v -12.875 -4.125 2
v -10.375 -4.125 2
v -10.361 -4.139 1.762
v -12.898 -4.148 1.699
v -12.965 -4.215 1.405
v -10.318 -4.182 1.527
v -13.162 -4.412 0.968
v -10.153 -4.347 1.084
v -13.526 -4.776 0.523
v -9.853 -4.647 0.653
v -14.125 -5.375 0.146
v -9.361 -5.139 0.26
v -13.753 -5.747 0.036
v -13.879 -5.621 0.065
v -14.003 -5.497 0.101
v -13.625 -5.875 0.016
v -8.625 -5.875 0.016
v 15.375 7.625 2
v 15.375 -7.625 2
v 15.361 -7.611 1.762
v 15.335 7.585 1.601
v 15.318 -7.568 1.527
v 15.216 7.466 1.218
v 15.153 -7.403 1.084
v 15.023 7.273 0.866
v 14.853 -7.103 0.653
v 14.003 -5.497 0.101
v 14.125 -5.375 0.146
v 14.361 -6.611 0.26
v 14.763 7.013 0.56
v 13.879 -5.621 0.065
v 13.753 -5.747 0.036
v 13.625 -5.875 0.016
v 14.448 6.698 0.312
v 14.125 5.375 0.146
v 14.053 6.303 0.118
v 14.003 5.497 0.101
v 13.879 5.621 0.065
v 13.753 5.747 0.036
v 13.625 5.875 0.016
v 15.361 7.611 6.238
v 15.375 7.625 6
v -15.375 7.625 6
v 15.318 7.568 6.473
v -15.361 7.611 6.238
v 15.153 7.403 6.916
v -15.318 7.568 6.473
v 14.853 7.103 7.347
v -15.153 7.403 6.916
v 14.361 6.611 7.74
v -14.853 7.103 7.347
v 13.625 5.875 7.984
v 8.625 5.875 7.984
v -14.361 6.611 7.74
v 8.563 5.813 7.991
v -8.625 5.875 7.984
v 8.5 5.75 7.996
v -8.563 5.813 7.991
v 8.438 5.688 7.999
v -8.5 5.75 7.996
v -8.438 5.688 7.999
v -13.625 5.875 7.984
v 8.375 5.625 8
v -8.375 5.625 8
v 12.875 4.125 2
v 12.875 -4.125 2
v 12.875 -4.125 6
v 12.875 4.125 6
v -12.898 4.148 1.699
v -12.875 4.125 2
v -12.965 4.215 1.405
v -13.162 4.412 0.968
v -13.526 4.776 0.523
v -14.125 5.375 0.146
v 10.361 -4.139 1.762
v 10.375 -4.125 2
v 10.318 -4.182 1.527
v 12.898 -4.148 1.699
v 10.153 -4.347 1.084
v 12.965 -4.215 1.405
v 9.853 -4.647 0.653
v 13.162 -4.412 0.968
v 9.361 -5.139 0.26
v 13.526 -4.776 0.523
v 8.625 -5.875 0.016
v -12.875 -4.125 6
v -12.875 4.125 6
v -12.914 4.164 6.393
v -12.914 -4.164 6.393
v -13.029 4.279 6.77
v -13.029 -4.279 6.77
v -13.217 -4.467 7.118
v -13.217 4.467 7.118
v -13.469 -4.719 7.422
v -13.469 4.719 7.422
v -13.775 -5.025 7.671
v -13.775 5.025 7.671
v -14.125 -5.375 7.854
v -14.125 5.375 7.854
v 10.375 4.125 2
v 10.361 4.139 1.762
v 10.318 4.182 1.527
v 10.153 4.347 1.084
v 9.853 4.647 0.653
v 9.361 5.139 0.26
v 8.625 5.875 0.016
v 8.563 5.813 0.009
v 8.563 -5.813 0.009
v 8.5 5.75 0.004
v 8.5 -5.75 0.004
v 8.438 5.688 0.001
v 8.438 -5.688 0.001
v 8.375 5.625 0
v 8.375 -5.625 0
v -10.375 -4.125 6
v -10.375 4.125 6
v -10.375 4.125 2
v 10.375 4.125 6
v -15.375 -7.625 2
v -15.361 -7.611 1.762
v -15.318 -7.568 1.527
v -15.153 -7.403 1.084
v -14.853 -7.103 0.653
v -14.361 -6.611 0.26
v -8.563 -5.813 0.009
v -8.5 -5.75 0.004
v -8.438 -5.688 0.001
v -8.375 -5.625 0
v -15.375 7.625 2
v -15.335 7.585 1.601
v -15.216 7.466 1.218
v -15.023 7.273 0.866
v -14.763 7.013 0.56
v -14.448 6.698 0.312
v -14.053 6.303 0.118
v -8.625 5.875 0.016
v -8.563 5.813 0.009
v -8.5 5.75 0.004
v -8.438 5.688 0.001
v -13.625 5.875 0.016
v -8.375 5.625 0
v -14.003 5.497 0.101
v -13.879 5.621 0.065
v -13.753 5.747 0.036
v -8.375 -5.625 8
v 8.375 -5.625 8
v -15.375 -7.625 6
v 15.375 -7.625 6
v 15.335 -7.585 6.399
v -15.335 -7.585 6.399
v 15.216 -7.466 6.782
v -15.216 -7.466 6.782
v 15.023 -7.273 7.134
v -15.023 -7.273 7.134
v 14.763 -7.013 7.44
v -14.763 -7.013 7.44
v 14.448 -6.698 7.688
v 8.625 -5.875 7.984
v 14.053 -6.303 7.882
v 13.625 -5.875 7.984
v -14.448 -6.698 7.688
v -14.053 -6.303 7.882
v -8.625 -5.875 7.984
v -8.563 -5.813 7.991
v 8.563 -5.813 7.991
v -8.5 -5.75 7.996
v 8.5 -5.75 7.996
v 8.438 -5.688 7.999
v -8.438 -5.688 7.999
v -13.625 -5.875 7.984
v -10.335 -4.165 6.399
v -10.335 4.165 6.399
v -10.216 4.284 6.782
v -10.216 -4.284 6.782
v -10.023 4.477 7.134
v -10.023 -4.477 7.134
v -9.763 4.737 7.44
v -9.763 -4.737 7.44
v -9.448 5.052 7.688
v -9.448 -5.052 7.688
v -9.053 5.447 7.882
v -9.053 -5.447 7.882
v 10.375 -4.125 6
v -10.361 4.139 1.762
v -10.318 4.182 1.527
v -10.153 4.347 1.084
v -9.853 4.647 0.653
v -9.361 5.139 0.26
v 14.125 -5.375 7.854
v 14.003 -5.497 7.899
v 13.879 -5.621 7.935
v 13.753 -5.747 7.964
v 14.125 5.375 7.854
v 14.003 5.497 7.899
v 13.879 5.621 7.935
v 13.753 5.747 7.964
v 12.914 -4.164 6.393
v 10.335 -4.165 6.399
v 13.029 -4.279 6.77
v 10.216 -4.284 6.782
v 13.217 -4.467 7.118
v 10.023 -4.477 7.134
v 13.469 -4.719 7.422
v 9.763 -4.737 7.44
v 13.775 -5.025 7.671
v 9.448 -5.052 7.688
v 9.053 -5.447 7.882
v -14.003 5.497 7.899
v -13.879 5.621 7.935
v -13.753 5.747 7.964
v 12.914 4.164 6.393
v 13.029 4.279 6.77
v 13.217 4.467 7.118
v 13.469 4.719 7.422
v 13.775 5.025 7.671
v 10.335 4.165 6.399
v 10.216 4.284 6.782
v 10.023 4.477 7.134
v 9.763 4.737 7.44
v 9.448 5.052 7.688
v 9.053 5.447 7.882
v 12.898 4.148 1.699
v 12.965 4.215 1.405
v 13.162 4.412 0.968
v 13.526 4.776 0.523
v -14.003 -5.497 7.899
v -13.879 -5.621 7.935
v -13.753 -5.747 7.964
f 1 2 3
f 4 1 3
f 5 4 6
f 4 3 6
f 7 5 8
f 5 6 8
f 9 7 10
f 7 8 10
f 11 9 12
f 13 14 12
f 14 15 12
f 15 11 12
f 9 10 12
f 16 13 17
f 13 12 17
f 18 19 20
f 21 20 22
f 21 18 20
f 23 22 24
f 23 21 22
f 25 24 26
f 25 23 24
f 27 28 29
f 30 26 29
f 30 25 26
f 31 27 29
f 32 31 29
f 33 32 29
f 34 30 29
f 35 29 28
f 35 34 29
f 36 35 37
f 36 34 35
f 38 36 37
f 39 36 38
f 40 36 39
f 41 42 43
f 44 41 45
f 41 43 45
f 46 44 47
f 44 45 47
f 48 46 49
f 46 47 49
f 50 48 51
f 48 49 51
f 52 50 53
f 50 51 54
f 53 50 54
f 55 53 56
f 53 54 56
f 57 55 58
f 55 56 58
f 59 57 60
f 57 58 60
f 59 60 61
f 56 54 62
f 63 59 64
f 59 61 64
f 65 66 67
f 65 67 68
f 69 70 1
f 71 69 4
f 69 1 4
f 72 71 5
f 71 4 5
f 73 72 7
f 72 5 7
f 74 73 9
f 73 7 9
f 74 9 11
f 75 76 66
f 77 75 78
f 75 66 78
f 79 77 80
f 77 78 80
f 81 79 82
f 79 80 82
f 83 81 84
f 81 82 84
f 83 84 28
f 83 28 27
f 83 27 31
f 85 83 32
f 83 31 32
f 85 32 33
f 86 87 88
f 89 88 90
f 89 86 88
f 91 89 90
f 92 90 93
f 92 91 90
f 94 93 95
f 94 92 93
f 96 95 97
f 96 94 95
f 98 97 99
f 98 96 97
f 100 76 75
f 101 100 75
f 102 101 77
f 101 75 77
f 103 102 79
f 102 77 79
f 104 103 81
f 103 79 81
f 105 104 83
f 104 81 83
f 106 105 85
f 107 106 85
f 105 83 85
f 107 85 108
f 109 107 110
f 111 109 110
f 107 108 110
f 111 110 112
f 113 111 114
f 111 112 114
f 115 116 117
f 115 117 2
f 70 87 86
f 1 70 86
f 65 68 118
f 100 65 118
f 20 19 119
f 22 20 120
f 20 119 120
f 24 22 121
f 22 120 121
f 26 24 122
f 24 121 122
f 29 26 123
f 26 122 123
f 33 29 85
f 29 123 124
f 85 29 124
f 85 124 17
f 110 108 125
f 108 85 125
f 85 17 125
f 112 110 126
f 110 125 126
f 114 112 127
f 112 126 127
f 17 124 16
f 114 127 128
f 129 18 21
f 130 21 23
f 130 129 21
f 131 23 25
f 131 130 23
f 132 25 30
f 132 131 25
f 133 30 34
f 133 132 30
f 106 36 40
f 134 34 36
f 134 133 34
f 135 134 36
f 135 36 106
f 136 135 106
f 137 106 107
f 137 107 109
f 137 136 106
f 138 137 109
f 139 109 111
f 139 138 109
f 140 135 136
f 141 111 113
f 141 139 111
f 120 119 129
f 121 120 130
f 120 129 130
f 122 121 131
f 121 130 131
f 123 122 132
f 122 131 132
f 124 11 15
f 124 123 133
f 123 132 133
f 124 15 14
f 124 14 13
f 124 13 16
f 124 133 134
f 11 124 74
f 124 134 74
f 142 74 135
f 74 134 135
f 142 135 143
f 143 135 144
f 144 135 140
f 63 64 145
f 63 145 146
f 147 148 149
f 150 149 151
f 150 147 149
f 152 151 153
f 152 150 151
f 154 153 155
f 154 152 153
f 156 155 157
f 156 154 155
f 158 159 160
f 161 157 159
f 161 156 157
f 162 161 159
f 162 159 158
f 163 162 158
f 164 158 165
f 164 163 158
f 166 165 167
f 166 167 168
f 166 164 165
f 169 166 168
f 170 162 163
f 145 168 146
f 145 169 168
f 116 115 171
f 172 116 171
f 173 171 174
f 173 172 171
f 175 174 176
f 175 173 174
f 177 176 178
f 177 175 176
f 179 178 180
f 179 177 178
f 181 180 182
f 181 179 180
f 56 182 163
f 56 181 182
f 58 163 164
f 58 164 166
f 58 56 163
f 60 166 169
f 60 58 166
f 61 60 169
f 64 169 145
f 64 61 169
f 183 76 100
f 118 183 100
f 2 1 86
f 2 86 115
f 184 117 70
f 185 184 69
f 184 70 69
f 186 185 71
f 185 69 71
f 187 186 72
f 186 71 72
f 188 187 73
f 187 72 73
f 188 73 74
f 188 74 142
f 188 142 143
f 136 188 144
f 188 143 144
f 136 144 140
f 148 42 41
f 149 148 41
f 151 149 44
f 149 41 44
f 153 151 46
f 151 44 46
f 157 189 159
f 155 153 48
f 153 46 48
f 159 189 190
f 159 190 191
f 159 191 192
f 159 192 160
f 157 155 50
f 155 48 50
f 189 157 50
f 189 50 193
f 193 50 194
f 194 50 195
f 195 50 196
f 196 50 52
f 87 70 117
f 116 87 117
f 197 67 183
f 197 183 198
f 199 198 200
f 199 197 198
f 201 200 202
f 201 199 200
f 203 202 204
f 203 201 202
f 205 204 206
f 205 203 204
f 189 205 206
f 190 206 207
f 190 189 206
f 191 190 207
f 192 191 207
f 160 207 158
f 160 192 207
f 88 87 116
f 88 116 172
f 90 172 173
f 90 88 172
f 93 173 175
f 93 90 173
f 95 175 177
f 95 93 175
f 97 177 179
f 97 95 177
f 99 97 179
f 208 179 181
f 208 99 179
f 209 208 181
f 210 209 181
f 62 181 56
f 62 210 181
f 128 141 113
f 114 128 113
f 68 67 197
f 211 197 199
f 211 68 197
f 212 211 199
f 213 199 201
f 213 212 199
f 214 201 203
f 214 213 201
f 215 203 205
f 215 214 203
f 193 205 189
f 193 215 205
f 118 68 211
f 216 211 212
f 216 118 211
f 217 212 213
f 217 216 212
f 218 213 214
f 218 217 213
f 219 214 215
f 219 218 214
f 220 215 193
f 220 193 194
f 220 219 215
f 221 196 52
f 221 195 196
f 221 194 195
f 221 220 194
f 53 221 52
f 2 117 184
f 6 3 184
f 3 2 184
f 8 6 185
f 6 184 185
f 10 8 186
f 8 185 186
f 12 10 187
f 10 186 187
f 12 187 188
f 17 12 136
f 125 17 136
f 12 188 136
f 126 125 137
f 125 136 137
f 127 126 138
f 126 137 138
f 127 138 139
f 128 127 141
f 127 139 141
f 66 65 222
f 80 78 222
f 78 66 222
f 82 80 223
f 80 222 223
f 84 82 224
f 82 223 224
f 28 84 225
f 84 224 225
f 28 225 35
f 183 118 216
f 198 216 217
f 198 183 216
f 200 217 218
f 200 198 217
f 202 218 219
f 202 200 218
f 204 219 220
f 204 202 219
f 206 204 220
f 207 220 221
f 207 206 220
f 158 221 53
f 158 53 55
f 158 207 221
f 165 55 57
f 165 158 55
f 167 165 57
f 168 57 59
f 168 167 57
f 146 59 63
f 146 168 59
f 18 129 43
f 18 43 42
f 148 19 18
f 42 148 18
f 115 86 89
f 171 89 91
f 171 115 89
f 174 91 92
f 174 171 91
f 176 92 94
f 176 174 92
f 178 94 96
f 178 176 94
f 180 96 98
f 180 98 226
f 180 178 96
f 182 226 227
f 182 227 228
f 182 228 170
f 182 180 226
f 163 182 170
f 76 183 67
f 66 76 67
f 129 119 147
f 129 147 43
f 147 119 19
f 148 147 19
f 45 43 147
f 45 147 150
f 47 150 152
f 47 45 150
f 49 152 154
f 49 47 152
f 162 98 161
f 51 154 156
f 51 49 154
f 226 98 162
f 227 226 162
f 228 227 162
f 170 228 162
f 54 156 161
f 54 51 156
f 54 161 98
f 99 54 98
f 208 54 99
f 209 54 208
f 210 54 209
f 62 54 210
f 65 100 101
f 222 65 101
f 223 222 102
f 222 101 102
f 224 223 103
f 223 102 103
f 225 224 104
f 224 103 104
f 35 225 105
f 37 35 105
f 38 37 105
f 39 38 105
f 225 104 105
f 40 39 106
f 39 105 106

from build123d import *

# Parameters (mm, degrees)
F0_W          = 30.75
F0_H          = 15.25
F0_W_2        = 2.5
F0_H_2        = 8.25
F1_DEPTH      = 8
F2_T1_DEPTH   = 40.75
F2_T3_DEPTH   = 25.25
F2_T5_DEPTH   = 2.5
F2_T7_DEPTH   = 8.25
F2_T9_DEPTH   = 2.5
F2_T15_DEPTH  = 7.5
F2_T20_DEPTH  = 13.25
F2_T28_DEPTH  = 7.5
F2_T32_DEPTH  = 13.25
F2_T40_DEPTH  = 13.25
F2_T45_DEPTH  = 7.5
F2_T52_DEPTH  = 7.5
F2_T57_DEPTH  = 13.25
F2_T65_DEPTH  = 13.25
F2_T70_DEPTH  = 7.5
F2_T77_DEPTH  = 13.25
F2_T82_DEPTH  = 7.5
F2_T89_DEPTH  = 7.5
F2_T94_DEPTH  = 13.25
F2_T102_DEPTH = 13.25
F2_T107_DEPTH = 7.5
F2_T115_DEPTH = 7.5
F2_T120_DEPTH = 13.25
F2_T128_DEPTH = 7.5
F2_T132_DEPTH = 13.25
F2_T140_DEPTH = 13.25
F2_T145_DEPTH = 7.5
F2_T152_DEPTH = 7.5
F2_T157_DEPTH = 13.25
F2_T165_DEPTH = 13.25
F2_T170_DEPTH = 7.5
F2_T177_DEPTH = 13.25
F2_T182_DEPTH = 7.5
F2_T189_DEPTH = 7.5
F2_T194_DEPTH = 13.25
F2_T202_DEPTH = 13.25
F2_T207_DEPTH = 7.5


# Not quite as in the source:
# - a fillet or chamfer that OpenCascade refuses, or shapes differently, is made with other operations: its cross-section is extruded or revolved along the edge and cut away or added


with BuildPart() as f1:
    # F0 (on Top) → F1 (new body)
    with BuildSketch(Plane.XY):
        Rectangle(F0_W, F0_H)
        with Locations((-11.625, 0)):
            Rectangle(F0_W_2, F0_H_2, mode=Mode.SUBTRACT)
        with Locations((11.625, 0)):
            Rectangle(F0_W_2, F0_H_2, mode=Mode.SUBTRACT)
    extrude(amount=F1_DEPTH)

    # F2: fillet of radius 2 on 24 edges, made by hand

    # F2_s2 → F2_t1 (cut)
    with BuildSketch(Plane.YZ.offset(-20.375)):
        with BuildLine():
            ThreePointArc((7.625, 6), (7.0392135624, 7.4142135624), (5.625, 8))
            Line((5.625, 8), (7.625, 8))
            Line((7.625, 8), (7.625, 6))
        make_face()
        with BuildLine():
            ThreePointArc((-7.625, 6), (-7.0392135624, 7.4142135624), (-5.625, 8))
            Line((-5.625, 8), (-7.625, 8))
            Line((-7.625, 8), (-7.625, 6))
        make_face()
        with BuildLine():
            ThreePointArc((7.625, 2), (7.0392135624, 0.5857864376), (5.625, 0))
            Line((5.625, 0), (7.625, 0))
            Line((7.625, 0), (7.625, 2))
        make_face()
        with BuildLine():
            ThreePointArc((-7.625, 2), (-7.0392135624, 0.5857864376), (-5.625, 0))
            Line((-5.625, 0), (-7.625, 0))
            Line((-7.625, 0), (-7.625, 2))
        make_face()
    extrude(amount=F2_T1_DEPTH, mode=Mode.SUBTRACT)

    # F2_s4 → F2_t3 (cut)
    with BuildSketch(Plane.XZ.offset(-12.625)):
        with BuildLine():
            ThreePointArc((-15.375, 6), (-14.7892135624, 7.4142135624), (-13.375, 8))
            Line((-13.375, 8), (-15.375, 8))
            Line((-15.375, 8), (-15.375, 6))
        make_face()
        with BuildLine():
            ThreePointArc((15.375, 6), (14.7892135624, 7.4142135624), (13.375, 8))
            Line((13.375, 8), (15.375, 8))
            Line((15.375, 8), (15.375, 6))
        make_face()
        with BuildLine():
            ThreePointArc((-15.375, 2), (-14.7892135624, 0.5857864376), (-13.375, 0))
            Line((-13.375, 0), (-15.375, 0))
            Line((-15.375, 0), (-15.375, 2))
        make_face()
        with BuildLine():
            ThreePointArc((15.375, 2), (14.7892135624, 0.5857864376), (13.375, 0))
            Line((13.375, 0), (15.375, 0))
            Line((15.375, 0), (15.375, 2))
        make_face()
    extrude(amount=F2_T3_DEPTH, mode=Mode.SUBTRACT)

    # F2_s6 → F2_t5 (cut)
    with BuildSketch(Plane.YZ.offset(-12.875)):
        with BuildLine():
            ThreePointArc((4.125, 6), (4.7107864376, 7.4142135624), (6.125, 8))
            Line((6.125, 8), (4.125, 8))
            Line((4.125, 8), (4.125, 6))
        make_face()
        with BuildLine():
            ThreePointArc((-4.125, 6), (-4.7107864376, 7.4142135624), (-6.125, 8))
            Line((-6.125, 8), (-4.125, 8))
            Line((-4.125, 8), (-4.125, 6))
        make_face()
        with BuildLine():
            ThreePointArc((4.125, 2), (4.7107864376, 0.5857864376), (6.125, 0))
            Line((6.125, 0), (4.125, 0))
            Line((4.125, 0), (4.125, 2))
        make_face()
        with BuildLine():
            ThreePointArc((-4.125, 2), (-4.7107864376, 0.5857864376), (-6.125, 0))
            Line((-6.125, 0), (-4.125, 0))
            Line((-4.125, 0), (-4.125, 2))
        make_face()
    extrude(amount=F2_T5_DEPTH, mode=Mode.SUBTRACT)

    # F2_s8 → F2_t7 (cut)
    with BuildSketch(Plane.XZ.offset(-4.125)):
        with BuildLine():
            ThreePointArc((-10.375, 6), (-9.7892135624, 7.4142135624), (-8.375, 8))
            Line((-8.375, 8), (-10.375, 8))
            Line((-10.375, 8), (-10.375, 6))
        make_face()
        with BuildLine():
            ThreePointArc((-12.875, 6), (-13.4607864376, 7.4142135624), (-14.875, 8))
            Line((-14.875, 8), (-12.875, 8))
            Line((-12.875, 8), (-12.875, 6))
        make_face()
        with BuildLine():
            ThreePointArc((10.375, 6), (9.7892135624, 7.4142135624), (8.375, 8))
            Line((8.375, 8), (10.375, 8))
            Line((10.375, 8), (10.375, 6))
        make_face()
        with BuildLine():
            ThreePointArc((12.875, 6), (13.4607864376, 7.4142135624), (14.875, 8))
            Line((14.875, 8), (12.875, 8))
            Line((12.875, 8), (12.875, 6))
        make_face()
        with BuildLine():
            ThreePointArc((-10.375, 2), (-9.7892135624, 0.5857864376), (-8.375, 0))
            Line((-8.375, 0), (-10.375, 0))
            Line((-10.375, 0), (-10.375, 2))
        make_face()
        with BuildLine():
            ThreePointArc((-12.875, 2), (-13.4607864376, 0.5857864376), (-14.875, 0))
            Line((-14.875, 0), (-12.875, 0))
            Line((-12.875, 0), (-12.875, 2))
        make_face()
        with BuildLine():
            ThreePointArc((10.375, 2), (9.7892135624, 0.5857864376), (8.375, 0))
            Line((8.375, 0), (10.375, 0))
            Line((10.375, 0), (10.375, 2))
        make_face()
        with BuildLine():
            ThreePointArc((12.875, 2), (13.4607864376, 0.5857864376), (14.875, 0))
            Line((14.875, 0), (12.875, 0))
            Line((12.875, 0), (12.875, 2))
        make_face()
    extrude(amount=F2_T7_DEPTH, mode=Mode.SUBTRACT)

    # F2_s10 → F2_t9 (cut)
    with BuildSketch(Plane.YZ.offset(10.375)):
        with BuildLine():
            ThreePointArc((4.125, 6), (4.7107864376, 7.4142135624), (6.125, 8))
            Line((6.125, 8), (4.125, 8))
            Line((4.125, 8), (4.125, 6))
        make_face()
        with BuildLine():
            ThreePointArc((-4.125, 6), (-4.7107864376, 7.4142135624), (-6.125, 8))
            Line((-6.125, 8), (-4.125, 8))
            Line((-4.125, 8), (-4.125, 6))
        make_face()
        with BuildLine():
            ThreePointArc((4.125, 2), (4.7107864376, 0.5857864376), (6.125, 0))
            Line((6.125, 0), (4.125, 0))
            Line((4.125, 0), (4.125, 2))
        make_face()
        with BuildLine():
            ThreePointArc((-4.125, 2), (-4.7107864376, 0.5857864376), (-6.125, 0))
            Line((-6.125, 0), (-4.125, 0))
            Line((-4.125, 0), (-4.125, 2))
        make_face()
    extrude(amount=F2_T9_DEPTH, mode=Mode.SUBTRACT)


with BuildPart() as f2_tool13:
    # F2_s14 → F2_t15 (new body)
    with BuildSketch(Plane.YZ.offset(-17.875)):
        with BuildLine():
            ThreePointArc((4.125, 6), (4.7107864376, 7.4142135624), (6.125, 8))
            Line((6.125, 8), (4.125, 8))
            Line((4.125, 8), (4.125, 6))
        make_face()
    extrude(amount=F2_T15_DEPTH)

    split(bisect_by=Plane.YZ.offset(-15.375), keep=Keep.TOP)

    split(bisect_by=Plane.YZ.offset(-12.875), keep=Keep.BOTTOM)


with BuildPart() as f2_tool18:
    # F2_s19 → F2_t20 (new body)
    with BuildSketch(Plane.XZ.offset(4.125)):
        with BuildLine():
            ThreePointArc((-12.875, 6), (-13.4607864376, 7.4142135624), (-14.875, 8))
            Line((-14.875, 8), (-12.875, 8))
            Line((-12.875, 8), (-12.875, 6))
        make_face()
    extrude(amount=-F2_T20_DEPTH)

    split(bisect_by=Plane.XZ.offset(-7.625), keep=Keep.TOP)

    split(bisect_by=Plane.XZ.offset(-4.125), keep=Keep.BOTTOM)


with BuildPart() as f2_tool13_1:
    add(f2_tool13.part)

    # F2_t23: intersect F2_tool18
    add(f2_tool18.part, mode=Mode.INTERSECT)


with BuildPart() as f1_1:
    add(f1.part)

    # F2_t11: cut F2_tool13
    add(f2_tool13_1.part, mode=Mode.SUBTRACT)


with BuildPart() as f2_tool26:
    # F2_s27 → F2_t28 (new body)
    with BuildSketch(Plane.YZ.offset(-12.875)):
        with BuildLine():
            ThreePointArc((4.125, 6), (4.7107864376, 7.4142135624), (6.125, 8))
            Line((6.125, 8), (4.125, 8))
            Line((4.125, 8), (4.125, 6))
        make_face()
    extrude(amount=F2_T28_DEPTH)

    split(bisect_by=Plane.YZ.offset(-10.375), keep=Keep.TOP)


with BuildPart() as f2_tool30:
    # F2_s31 → F2_t32 (new body)
    with BuildSketch(Plane.XZ.offset(-9.125)):
        with BuildLine():
            ThreePointArc((-10.375, 6), (-9.7892135624, 7.4142135624), (-8.375, 8))
            Line((-8.375, 8), (-10.375, 8))
            Line((-10.375, 8), (-10.375, 6))
        make_face()
    extrude(amount=F2_T32_DEPTH)

    split(bisect_by=Plane.XZ.offset(-7.625), keep=Keep.TOP)

    split(bisect_by=Plane.XZ.offset(-4.125), keep=Keep.BOTTOM)


with BuildPart() as f2_tool26_1:
    add(f2_tool26.part)

    # F2_t35: intersect F2_tool30
    add(f2_tool30.part, mode=Mode.INTERSECT)


with BuildPart() as f1_2:
    add(f1_1.part)

    # F2_t24: cut F2_tool26
    add(f2_tool26_1.part, mode=Mode.SUBTRACT)


with BuildPart() as f2_tool38:
    # F2_s39 → F2_t40 (new body)
    with BuildSketch(Plane.XZ.offset(-4.125)):
        with BuildLine():
            ThreePointArc((-10.375, 6), (-9.7892135624, 7.4142135624), (-8.375, 8))
            Line((-8.375, 8), (-10.375, 8))
            Line((-10.375, 8), (-10.375, 6))
        make_face()
    extrude(amount=F2_T40_DEPTH)

    split(bisect_by=Plane.XZ.offset(7.625), keep=Keep.BOTTOM)

    split(bisect_by=Plane.XZ.offset(4.125), keep=Keep.TOP)


with BuildPart() as f2_tool43:
    # F2_s44 → F2_t45 (new body)
    with BuildSketch(Plane.YZ.offset(-5.375)):
        with BuildLine():
            ThreePointArc((-4.125, 6), (-4.7107864376, 7.4142135624), (-6.125, 8))
            Line((-6.125, 8), (-4.125, 8))
            Line((-4.125, 8), (-4.125, 6))
        make_face()
    extrude(amount=-F2_T45_DEPTH)

    split(bisect_by=Plane.YZ.offset(-10.375), keep=Keep.TOP)


with BuildPart() as f2_tool38_1:
    add(f2_tool38.part)

    # F2_t47: intersect F2_tool43
    add(f2_tool43.part, mode=Mode.INTERSECT)


with BuildPart() as f1_3:
    add(f1_2.part)

    # F2_t36: cut F2_tool38
    add(f2_tool38_1.part, mode=Mode.SUBTRACT)


with BuildPart() as f2_tool50:
    # F2_s51 → F2_t52 (new body)
    with BuildSketch(Plane.YZ.offset(-10.375)):
        with BuildLine():
            ThreePointArc((-4.125, 6), (-4.7107864376, 7.4142135624), (-6.125, 8))
            Line((-6.125, 8), (-4.125, 8))
            Line((-4.125, 8), (-4.125, 6))
        make_face()
    extrude(amount=-F2_T52_DEPTH)

    split(bisect_by=Plane.YZ.offset(-15.375), keep=Keep.TOP)

    split(bisect_by=Plane.YZ.offset(-12.875), keep=Keep.BOTTOM)


with BuildPart() as f2_tool55:
    # F2_s56 → F2_t57 (new body)
    with BuildSketch(Plane.XZ.offset(9.125)):
        with BuildLine():
            ThreePointArc((-12.875, 6), (-13.4607864376, 7.4142135624), (-14.875, 8))
            Line((-14.875, 8), (-12.875, 8))
            Line((-12.875, 8), (-12.875, 6))
        make_face()
    extrude(amount=-F2_T57_DEPTH)

    split(bisect_by=Plane.XZ.offset(7.625), keep=Keep.BOTTOM)

    split(bisect_by=Plane.XZ.offset(4.125), keep=Keep.TOP)


with BuildPart() as f2_tool50_1:
    add(f2_tool50.part)

    # F2_t60: intersect F2_tool55
    add(f2_tool55.part, mode=Mode.INTERSECT)


with BuildPart() as f1_4:
    add(f1_3.part)

    # F2_t48: cut F2_tool50
    add(f2_tool50_1.part, mode=Mode.SUBTRACT)


with BuildPart() as f2_tool63:
    # F2_s64 → F2_t65 (new body)
    with BuildSketch(Plane.XZ.offset(9.125)):
        with BuildLine():
            ThreePointArc((10.375, 6), (9.7892135624, 7.4142135624), (8.375, 8))
            Line((8.375, 8), (10.375, 8))
            Line((10.375, 8), (10.375, 6))
        make_face()
    extrude(amount=-F2_T65_DEPTH)

    split(bisect_by=Plane.XZ.offset(7.625), keep=Keep.BOTTOM)

    split(bisect_by=Plane.XZ.offset(4.125), keep=Keep.TOP)


with BuildPart() as f2_tool68:
    # F2_s69 → F2_t70 (new body)
    with BuildSketch(Plane.YZ.offset(12.875)):
        with BuildLine():
            ThreePointArc((-4.125, 6), (-4.7107864376, 7.4142135624), (-6.125, 8))
            Line((-6.125, 8), (-4.125, 8))
            Line((-4.125, 8), (-4.125, 6))
        make_face()
    extrude(amount=-F2_T70_DEPTH)

    split(bisect_by=Plane.YZ.offset(10.375), keep=Keep.BOTTOM)


with BuildPart() as f2_tool63_1:
    add(f2_tool63.part)

    # F2_t72: intersect F2_tool68
    add(f2_tool68.part, mode=Mode.INTERSECT)


with BuildPart() as f1_5:
    add(f1_4.part)

    # F2_t61: cut F2_tool63
    add(f2_tool63_1.part, mode=Mode.SUBTRACT)


with BuildPart() as f2_tool75:
    # F2_s76 → F2_t77 (new body)
    with BuildSketch(Plane.XZ.offset(4.125)):
        with BuildLine():
            ThreePointArc((10.375, 6), (9.7892135624, 7.4142135624), (8.375, 8))
            Line((8.375, 8), (10.375, 8))
            Line((10.375, 8), (10.375, 6))
        make_face()
    extrude(amount=-F2_T77_DEPTH)

    split(bisect_by=Plane.XZ.offset(-7.625), keep=Keep.TOP)

    split(bisect_by=Plane.XZ.offset(-4.125), keep=Keep.BOTTOM)


with BuildPart() as f2_tool80:
    # F2_s81 → F2_t82 (new body)
    with BuildSketch(Plane.YZ.offset(5.375)):
        with BuildLine():
            ThreePointArc((4.125, 6), (4.7107864376, 7.4142135624), (6.125, 8))
            Line((6.125, 8), (4.125, 8))
            Line((4.125, 8), (4.125, 6))
        make_face()
    extrude(amount=F2_T82_DEPTH)

    split(bisect_by=Plane.YZ.offset(10.375), keep=Keep.BOTTOM)


with BuildPart() as f2_tool75_1:
    add(f2_tool75.part)

    # F2_t84: intersect F2_tool80
    add(f2_tool80.part, mode=Mode.INTERSECT)


with BuildPart() as f1_6:
    add(f1_5.part)

    # F2_t73: cut F2_tool75
    add(f2_tool75_1.part, mode=Mode.SUBTRACT)


with BuildPart() as f2_tool87:
    # F2_s88 → F2_t89 (new body)
    with BuildSketch(Plane.YZ.offset(10.375)):
        with BuildLine():
            ThreePointArc((4.125, 6), (4.7107864376, 7.4142135624), (6.125, 8))
            Line((6.125, 8), (4.125, 8))
            Line((4.125, 8), (4.125, 6))
        make_face()
    extrude(amount=F2_T89_DEPTH)

    split(bisect_by=Plane.YZ.offset(15.375), keep=Keep.BOTTOM)

    split(bisect_by=Plane.YZ.offset(12.875), keep=Keep.TOP)


with BuildPart() as f2_tool92:
    # F2_s93 → F2_t94 (new body)
    with BuildSketch(Plane.XZ.offset(-9.125)):
        with BuildLine():
            ThreePointArc((12.875, 6), (13.4607864376, 7.4142135624), (14.875, 8))
            Line((14.875, 8), (12.875, 8))
            Line((12.875, 8), (12.875, 6))
        make_face()
    extrude(amount=F2_T94_DEPTH)

    split(bisect_by=Plane.XZ.offset(-7.625), keep=Keep.TOP)

    split(bisect_by=Plane.XZ.offset(-4.125), keep=Keep.BOTTOM)


with BuildPart() as f2_tool87_1:
    add(f2_tool87.part)

    # F2_t97: intersect F2_tool92
    add(f2_tool92.part, mode=Mode.INTERSECT)


with BuildPart() as f1_7:
    add(f1_6.part)

    # F2_t85: cut F2_tool87
    add(f2_tool87_1.part, mode=Mode.SUBTRACT)


with BuildPart() as f2_tool100:
    # F2_s101 → F2_t102 (new body)
    with BuildSketch(Plane.XZ.offset(-4.125)):
        with BuildLine():
            ThreePointArc((12.875, 6), (13.4607864376, 7.4142135624), (14.875, 8))
            Line((14.875, 8), (12.875, 8))
            Line((12.875, 8), (12.875, 6))
        make_face()
    extrude(amount=F2_T102_DEPTH)

    split(bisect_by=Plane.XZ.offset(7.625), keep=Keep.BOTTOM)

    split(bisect_by=Plane.XZ.offset(4.125), keep=Keep.TOP)


with BuildPart() as f2_tool105:
    # F2_s106 → F2_t107 (new body)
    with BuildSketch(Plane.YZ.offset(17.875)):
        with BuildLine():
            ThreePointArc((-4.125, 6), (-4.7107864376, 7.4142135624), (-6.125, 8))
            Line((-6.125, 8), (-4.125, 8))
            Line((-4.125, 8), (-4.125, 6))
        make_face()
    extrude(amount=-F2_T107_DEPTH)

    split(bisect_by=Plane.YZ.offset(15.375), keep=Keep.BOTTOM)

    split(bisect_by=Plane.YZ.offset(12.875), keep=Keep.TOP)


with BuildPart() as f2_tool100_1:
    add(f2_tool100.part)

    # F2_t110: intersect F2_tool105
    add(f2_tool105.part, mode=Mode.INTERSECT)


with BuildPart() as f1_8:
    add(f1_7.part)

    # F2_t98: cut F2_tool100
    add(f2_tool100_1.part, mode=Mode.SUBTRACT)


with BuildPart() as f2_tool113:
    # F2_s114 → F2_t115 (new body)
    with BuildSketch(Plane.YZ.offset(-17.875)):
        with BuildLine():
            ThreePointArc((4.125, 2), (4.7107864376, 0.5857864376), (6.125, 0))
            Line((6.125, 0), (4.125, 0))
            Line((4.125, 0), (4.125, 2))
        make_face()
    extrude(amount=F2_T115_DEPTH)

    split(bisect_by=Plane.YZ.offset(-15.375), keep=Keep.TOP)

    split(bisect_by=Plane.YZ.offset(-12.875), keep=Keep.BOTTOM)


with BuildPart() as f2_tool118:
    # F2_s119 → F2_t120 (new body)
    with BuildSketch(Plane.XZ.offset(4.125)):
        with BuildLine():
            ThreePointArc((-12.875, 2), (-13.4607864376, 0.5857864376), (-14.875, 0))
            Line((-14.875, 0), (-12.875, 0))
            Line((-12.875, 0), (-12.875, 2))
        make_face()
    extrude(amount=-F2_T120_DEPTH)

    split(bisect_by=Plane.XZ.offset(-7.625), keep=Keep.TOP)

    split(bisect_by=Plane.XZ.offset(-4.125), keep=Keep.BOTTOM)


with BuildPart() as f2_tool113_1:
    add(f2_tool113.part)

    # F2_t123: intersect F2_tool118
    add(f2_tool118.part, mode=Mode.INTERSECT)


with BuildPart() as f1_9:
    add(f1_8.part)

    # F2_t111: cut F2_tool113
    add(f2_tool113_1.part, mode=Mode.SUBTRACT)


with BuildPart() as f2_tool126:
    # F2_s127 → F2_t128 (new body)
    with BuildSketch(Plane.YZ.offset(-12.875)):
        with BuildLine():
            ThreePointArc((4.125, 2), (4.7107864376, 0.5857864376), (6.125, 0))
            Line((6.125, 0), (4.125, 0))
            Line((4.125, 0), (4.125, 2))
        make_face()
    extrude(amount=F2_T128_DEPTH)

    split(bisect_by=Plane.YZ.offset(-10.375), keep=Keep.TOP)


with BuildPart() as f2_tool130:
    # F2_s131 → F2_t132 (new body)
    with BuildSketch(Plane.XZ.offset(-9.125)):
        with BuildLine():
            ThreePointArc((-10.375, 2), (-9.7892135624, 0.5857864376), (-8.375, 0))
            Line((-8.375, 0), (-10.375, 0))
            Line((-10.375, 0), (-10.375, 2))
        make_face()
    extrude(amount=F2_T132_DEPTH)

    split(bisect_by=Plane.XZ.offset(-7.625), keep=Keep.TOP)

    split(bisect_by=Plane.XZ.offset(-4.125), keep=Keep.BOTTOM)


with BuildPart() as f2_tool126_1:
    add(f2_tool126.part)

    # F2_t135: intersect F2_tool130
    add(f2_tool130.part, mode=Mode.INTERSECT)


with BuildPart() as f1_10:
    add(f1_9.part)

    # F2_t124: cut F2_tool126
    add(f2_tool126_1.part, mode=Mode.SUBTRACT)


with BuildPart() as f2_tool138:
    # F2_s139 → F2_t140 (new body)
    with BuildSketch(Plane.XZ.offset(-4.125)):
        with BuildLine():
            ThreePointArc((-10.375, 2), (-9.7892135624, 0.5857864376), (-8.375, 0))
            Line((-8.375, 0), (-10.375, 0))
            Line((-10.375, 0), (-10.375, 2))
        make_face()
    extrude(amount=F2_T140_DEPTH)

    split(bisect_by=Plane.XZ.offset(7.625), keep=Keep.BOTTOM)

    split(bisect_by=Plane.XZ.offset(4.125), keep=Keep.TOP)


with BuildPart() as f2_tool143:
    # F2_s144 → F2_t145 (new body)
    with BuildSketch(Plane.YZ.offset(-5.375)):
        with BuildLine():
            ThreePointArc((-4.125, 2), (-4.7107864376, 0.5857864376), (-6.125, 0))
            Line((-6.125, 0), (-4.125, 0))
            Line((-4.125, 0), (-4.125, 2))
        make_face()
    extrude(amount=-F2_T145_DEPTH)

    split(bisect_by=Plane.YZ.offset(-10.375), keep=Keep.TOP)


with BuildPart() as f2_tool138_1:
    add(f2_tool138.part)

    # F2_t147: intersect F2_tool143
    add(f2_tool143.part, mode=Mode.INTERSECT)


with BuildPart() as f1_11:
    add(f1_10.part)

    # F2_t136: cut F2_tool138
    add(f2_tool138_1.part, mode=Mode.SUBTRACT)


with BuildPart() as f2_tool150:
    # F2_s151 → F2_t152 (new body)
    with BuildSketch(Plane.YZ.offset(-10.375)):
        with BuildLine():
            ThreePointArc((-4.125, 2), (-4.7107864376, 0.5857864376), (-6.125, 0))
            Line((-6.125, 0), (-4.125, 0))
            Line((-4.125, 0), (-4.125, 2))
        make_face()
    extrude(amount=-F2_T152_DEPTH)

    split(bisect_by=Plane.YZ.offset(-15.375), keep=Keep.TOP)

    split(bisect_by=Plane.YZ.offset(-12.875), keep=Keep.BOTTOM)


with BuildPart() as f2_tool155:
    # F2_s156 → F2_t157 (new body)
    with BuildSketch(Plane.XZ.offset(9.125)):
        with BuildLine():
            ThreePointArc((-12.875, 2), (-13.4607864376, 0.5857864376), (-14.875, 0))
            Line((-14.875, 0), (-12.875, 0))
            Line((-12.875, 0), (-12.875, 2))
        make_face()
    extrude(amount=-F2_T157_DEPTH)

    split(bisect_by=Plane.XZ.offset(7.625), keep=Keep.BOTTOM)

    split(bisect_by=Plane.XZ.offset(4.125), keep=Keep.TOP)


with BuildPart() as f2_tool150_1:
    add(f2_tool150.part)

    # F2_t160: intersect F2_tool155
    add(f2_tool155.part, mode=Mode.INTERSECT)


with BuildPart() as f1_12:
    add(f1_11.part)

    # F2_t148: cut F2_tool150
    add(f2_tool150_1.part, mode=Mode.SUBTRACT)


with BuildPart() as f2_tool163:
    # F2_s164 → F2_t165 (new body)
    with BuildSketch(Plane.XZ.offset(9.125)):
        with BuildLine():
            ThreePointArc((10.375, 2), (9.7892135624, 0.5857864376), (8.375, 0))
            Line((8.375, 0), (10.375, 0))
            Line((10.375, 0), (10.375, 2))
        make_face()
    extrude(amount=-F2_T165_DEPTH)

    split(bisect_by=Plane.XZ.offset(7.625), keep=Keep.BOTTOM)

    split(bisect_by=Plane.XZ.offset(4.125), keep=Keep.TOP)


with BuildPart() as f2_tool168:
    # F2_s169 → F2_t170 (new body)
    with BuildSketch(Plane.YZ.offset(12.875)):
        with BuildLine():
            ThreePointArc((-4.125, 2), (-4.7107864376, 0.5857864376), (-6.125, 0))
            Line((-6.125, 0), (-4.125, 0))
            Line((-4.125, 0), (-4.125, 2))
        make_face()
    extrude(amount=-F2_T170_DEPTH)

    split(bisect_by=Plane.YZ.offset(10.375), keep=Keep.BOTTOM)


with BuildPart() as f2_tool163_1:
    add(f2_tool163.part)

    # F2_t172: intersect F2_tool168
    add(f2_tool168.part, mode=Mode.INTERSECT)


with BuildPart() as f1_13:
    add(f1_12.part)

    # F2_t161: cut F2_tool163
    add(f2_tool163_1.part, mode=Mode.SUBTRACT)


with BuildPart() as f2_tool175:
    # F2_s176 → F2_t177 (new body)
    with BuildSketch(Plane.XZ.offset(4.125)):
        with BuildLine():
            ThreePointArc((10.375, 2), (9.7892135624, 0.5857864376), (8.375, 0))
            Line((8.375, 0), (10.375, 0))
            Line((10.375, 0), (10.375, 2))
        make_face()
    extrude(amount=-F2_T177_DEPTH)

    split(bisect_by=Plane.XZ.offset(-7.625), keep=Keep.TOP)

    split(bisect_by=Plane.XZ.offset(-4.125), keep=Keep.BOTTOM)


with BuildPart() as f2_tool180:
    # F2_s181 → F2_t182 (new body)
    with BuildSketch(Plane.YZ.offset(5.375)):
        with BuildLine():
            ThreePointArc((4.125, 2), (4.7107864376, 0.5857864376), (6.125, 0))
            Line((6.125, 0), (4.125, 0))
            Line((4.125, 0), (4.125, 2))
        make_face()
    extrude(amount=F2_T182_DEPTH)

    split(bisect_by=Plane.YZ.offset(10.375), keep=Keep.BOTTOM)


with BuildPart() as f2_tool175_1:
    add(f2_tool175.part)

    # F2_t184: intersect F2_tool180
    add(f2_tool180.part, mode=Mode.INTERSECT)


with BuildPart() as f1_14:
    add(f1_13.part)

    # F2_t173: cut F2_tool175
    add(f2_tool175_1.part, mode=Mode.SUBTRACT)


with BuildPart() as f2_tool187:
    # F2_s188 → F2_t189 (new body)
    with BuildSketch(Plane.YZ.offset(10.375)):
        with BuildLine():
            ThreePointArc((4.125, 2), (4.7107864376, 0.5857864376), (6.125, 0))
            Line((6.125, 0), (4.125, 0))
            Line((4.125, 0), (4.125, 2))
        make_face()
    extrude(amount=F2_T189_DEPTH)

    split(bisect_by=Plane.YZ.offset(15.375), keep=Keep.BOTTOM)

    split(bisect_by=Plane.YZ.offset(12.875), keep=Keep.TOP)


with BuildPart() as f2_tool192:
    # F2_s193 → F2_t194 (new body)
    with BuildSketch(Plane.XZ.offset(-9.125)):
        with BuildLine():
            ThreePointArc((12.875, 2), (13.4607864376, 0.5857864376), (14.875, 0))
            Line((14.875, 0), (12.875, 0))
            Line((12.875, 0), (12.875, 2))
        make_face()
    extrude(amount=F2_T194_DEPTH)

    split(bisect_by=Plane.XZ.offset(-7.625), keep=Keep.TOP)

    split(bisect_by=Plane.XZ.offset(-4.125), keep=Keep.BOTTOM)


with BuildPart() as f2_tool187_1:
    add(f2_tool187.part)

    # F2_t197: intersect F2_tool192
    add(f2_tool192.part, mode=Mode.INTERSECT)


with BuildPart() as f1_15:
    add(f1_14.part)

    # F2_t185: cut F2_tool187
    add(f2_tool187_1.part, mode=Mode.SUBTRACT)


with BuildPart() as f2_tool200:
    # F2_s201 → F2_t202 (new body)
    with BuildSketch(Plane.XZ.offset(-4.125)):
        with BuildLine():
            ThreePointArc((12.875, 2), (13.4607864376, 0.5857864376), (14.875, 0))
            Line((14.875, 0), (12.875, 0))
            Line((12.875, 0), (12.875, 2))
        make_face()
    extrude(amount=F2_T202_DEPTH)

    split(bisect_by=Plane.XZ.offset(7.625), keep=Keep.BOTTOM)

    split(bisect_by=Plane.XZ.offset(4.125), keep=Keep.TOP)


with BuildPart() as f2_tool205:
    # F2_s206 → F2_t207 (new body)
    with BuildSketch(Plane.YZ.offset(17.875)):
        with BuildLine():
            ThreePointArc((-4.125, 2), (-4.7107864376, 0.5857864376), (-6.125, 0))
            Line((-6.125, 0), (-4.125, 0))
            Line((-4.125, 0), (-4.125, 2))
        make_face()
    extrude(amount=-F2_T207_DEPTH)

    split(bisect_by=Plane.YZ.offset(15.375), keep=Keep.BOTTOM)

    split(bisect_by=Plane.YZ.offset(12.875), keep=Keep.TOP)


with BuildPart() as f2_tool200_1:
    add(f2_tool200.part)

    # F2_t210: intersect F2_tool205
    add(f2_tool205.part, mode=Mode.INTERSECT)


with BuildPart() as f1_16:
    add(f1_15.part)

    # F2_t198: cut F2_tool200
    add(f2_tool200_1.part, mode=Mode.SUBTRACT)


solid = f1_16.part
